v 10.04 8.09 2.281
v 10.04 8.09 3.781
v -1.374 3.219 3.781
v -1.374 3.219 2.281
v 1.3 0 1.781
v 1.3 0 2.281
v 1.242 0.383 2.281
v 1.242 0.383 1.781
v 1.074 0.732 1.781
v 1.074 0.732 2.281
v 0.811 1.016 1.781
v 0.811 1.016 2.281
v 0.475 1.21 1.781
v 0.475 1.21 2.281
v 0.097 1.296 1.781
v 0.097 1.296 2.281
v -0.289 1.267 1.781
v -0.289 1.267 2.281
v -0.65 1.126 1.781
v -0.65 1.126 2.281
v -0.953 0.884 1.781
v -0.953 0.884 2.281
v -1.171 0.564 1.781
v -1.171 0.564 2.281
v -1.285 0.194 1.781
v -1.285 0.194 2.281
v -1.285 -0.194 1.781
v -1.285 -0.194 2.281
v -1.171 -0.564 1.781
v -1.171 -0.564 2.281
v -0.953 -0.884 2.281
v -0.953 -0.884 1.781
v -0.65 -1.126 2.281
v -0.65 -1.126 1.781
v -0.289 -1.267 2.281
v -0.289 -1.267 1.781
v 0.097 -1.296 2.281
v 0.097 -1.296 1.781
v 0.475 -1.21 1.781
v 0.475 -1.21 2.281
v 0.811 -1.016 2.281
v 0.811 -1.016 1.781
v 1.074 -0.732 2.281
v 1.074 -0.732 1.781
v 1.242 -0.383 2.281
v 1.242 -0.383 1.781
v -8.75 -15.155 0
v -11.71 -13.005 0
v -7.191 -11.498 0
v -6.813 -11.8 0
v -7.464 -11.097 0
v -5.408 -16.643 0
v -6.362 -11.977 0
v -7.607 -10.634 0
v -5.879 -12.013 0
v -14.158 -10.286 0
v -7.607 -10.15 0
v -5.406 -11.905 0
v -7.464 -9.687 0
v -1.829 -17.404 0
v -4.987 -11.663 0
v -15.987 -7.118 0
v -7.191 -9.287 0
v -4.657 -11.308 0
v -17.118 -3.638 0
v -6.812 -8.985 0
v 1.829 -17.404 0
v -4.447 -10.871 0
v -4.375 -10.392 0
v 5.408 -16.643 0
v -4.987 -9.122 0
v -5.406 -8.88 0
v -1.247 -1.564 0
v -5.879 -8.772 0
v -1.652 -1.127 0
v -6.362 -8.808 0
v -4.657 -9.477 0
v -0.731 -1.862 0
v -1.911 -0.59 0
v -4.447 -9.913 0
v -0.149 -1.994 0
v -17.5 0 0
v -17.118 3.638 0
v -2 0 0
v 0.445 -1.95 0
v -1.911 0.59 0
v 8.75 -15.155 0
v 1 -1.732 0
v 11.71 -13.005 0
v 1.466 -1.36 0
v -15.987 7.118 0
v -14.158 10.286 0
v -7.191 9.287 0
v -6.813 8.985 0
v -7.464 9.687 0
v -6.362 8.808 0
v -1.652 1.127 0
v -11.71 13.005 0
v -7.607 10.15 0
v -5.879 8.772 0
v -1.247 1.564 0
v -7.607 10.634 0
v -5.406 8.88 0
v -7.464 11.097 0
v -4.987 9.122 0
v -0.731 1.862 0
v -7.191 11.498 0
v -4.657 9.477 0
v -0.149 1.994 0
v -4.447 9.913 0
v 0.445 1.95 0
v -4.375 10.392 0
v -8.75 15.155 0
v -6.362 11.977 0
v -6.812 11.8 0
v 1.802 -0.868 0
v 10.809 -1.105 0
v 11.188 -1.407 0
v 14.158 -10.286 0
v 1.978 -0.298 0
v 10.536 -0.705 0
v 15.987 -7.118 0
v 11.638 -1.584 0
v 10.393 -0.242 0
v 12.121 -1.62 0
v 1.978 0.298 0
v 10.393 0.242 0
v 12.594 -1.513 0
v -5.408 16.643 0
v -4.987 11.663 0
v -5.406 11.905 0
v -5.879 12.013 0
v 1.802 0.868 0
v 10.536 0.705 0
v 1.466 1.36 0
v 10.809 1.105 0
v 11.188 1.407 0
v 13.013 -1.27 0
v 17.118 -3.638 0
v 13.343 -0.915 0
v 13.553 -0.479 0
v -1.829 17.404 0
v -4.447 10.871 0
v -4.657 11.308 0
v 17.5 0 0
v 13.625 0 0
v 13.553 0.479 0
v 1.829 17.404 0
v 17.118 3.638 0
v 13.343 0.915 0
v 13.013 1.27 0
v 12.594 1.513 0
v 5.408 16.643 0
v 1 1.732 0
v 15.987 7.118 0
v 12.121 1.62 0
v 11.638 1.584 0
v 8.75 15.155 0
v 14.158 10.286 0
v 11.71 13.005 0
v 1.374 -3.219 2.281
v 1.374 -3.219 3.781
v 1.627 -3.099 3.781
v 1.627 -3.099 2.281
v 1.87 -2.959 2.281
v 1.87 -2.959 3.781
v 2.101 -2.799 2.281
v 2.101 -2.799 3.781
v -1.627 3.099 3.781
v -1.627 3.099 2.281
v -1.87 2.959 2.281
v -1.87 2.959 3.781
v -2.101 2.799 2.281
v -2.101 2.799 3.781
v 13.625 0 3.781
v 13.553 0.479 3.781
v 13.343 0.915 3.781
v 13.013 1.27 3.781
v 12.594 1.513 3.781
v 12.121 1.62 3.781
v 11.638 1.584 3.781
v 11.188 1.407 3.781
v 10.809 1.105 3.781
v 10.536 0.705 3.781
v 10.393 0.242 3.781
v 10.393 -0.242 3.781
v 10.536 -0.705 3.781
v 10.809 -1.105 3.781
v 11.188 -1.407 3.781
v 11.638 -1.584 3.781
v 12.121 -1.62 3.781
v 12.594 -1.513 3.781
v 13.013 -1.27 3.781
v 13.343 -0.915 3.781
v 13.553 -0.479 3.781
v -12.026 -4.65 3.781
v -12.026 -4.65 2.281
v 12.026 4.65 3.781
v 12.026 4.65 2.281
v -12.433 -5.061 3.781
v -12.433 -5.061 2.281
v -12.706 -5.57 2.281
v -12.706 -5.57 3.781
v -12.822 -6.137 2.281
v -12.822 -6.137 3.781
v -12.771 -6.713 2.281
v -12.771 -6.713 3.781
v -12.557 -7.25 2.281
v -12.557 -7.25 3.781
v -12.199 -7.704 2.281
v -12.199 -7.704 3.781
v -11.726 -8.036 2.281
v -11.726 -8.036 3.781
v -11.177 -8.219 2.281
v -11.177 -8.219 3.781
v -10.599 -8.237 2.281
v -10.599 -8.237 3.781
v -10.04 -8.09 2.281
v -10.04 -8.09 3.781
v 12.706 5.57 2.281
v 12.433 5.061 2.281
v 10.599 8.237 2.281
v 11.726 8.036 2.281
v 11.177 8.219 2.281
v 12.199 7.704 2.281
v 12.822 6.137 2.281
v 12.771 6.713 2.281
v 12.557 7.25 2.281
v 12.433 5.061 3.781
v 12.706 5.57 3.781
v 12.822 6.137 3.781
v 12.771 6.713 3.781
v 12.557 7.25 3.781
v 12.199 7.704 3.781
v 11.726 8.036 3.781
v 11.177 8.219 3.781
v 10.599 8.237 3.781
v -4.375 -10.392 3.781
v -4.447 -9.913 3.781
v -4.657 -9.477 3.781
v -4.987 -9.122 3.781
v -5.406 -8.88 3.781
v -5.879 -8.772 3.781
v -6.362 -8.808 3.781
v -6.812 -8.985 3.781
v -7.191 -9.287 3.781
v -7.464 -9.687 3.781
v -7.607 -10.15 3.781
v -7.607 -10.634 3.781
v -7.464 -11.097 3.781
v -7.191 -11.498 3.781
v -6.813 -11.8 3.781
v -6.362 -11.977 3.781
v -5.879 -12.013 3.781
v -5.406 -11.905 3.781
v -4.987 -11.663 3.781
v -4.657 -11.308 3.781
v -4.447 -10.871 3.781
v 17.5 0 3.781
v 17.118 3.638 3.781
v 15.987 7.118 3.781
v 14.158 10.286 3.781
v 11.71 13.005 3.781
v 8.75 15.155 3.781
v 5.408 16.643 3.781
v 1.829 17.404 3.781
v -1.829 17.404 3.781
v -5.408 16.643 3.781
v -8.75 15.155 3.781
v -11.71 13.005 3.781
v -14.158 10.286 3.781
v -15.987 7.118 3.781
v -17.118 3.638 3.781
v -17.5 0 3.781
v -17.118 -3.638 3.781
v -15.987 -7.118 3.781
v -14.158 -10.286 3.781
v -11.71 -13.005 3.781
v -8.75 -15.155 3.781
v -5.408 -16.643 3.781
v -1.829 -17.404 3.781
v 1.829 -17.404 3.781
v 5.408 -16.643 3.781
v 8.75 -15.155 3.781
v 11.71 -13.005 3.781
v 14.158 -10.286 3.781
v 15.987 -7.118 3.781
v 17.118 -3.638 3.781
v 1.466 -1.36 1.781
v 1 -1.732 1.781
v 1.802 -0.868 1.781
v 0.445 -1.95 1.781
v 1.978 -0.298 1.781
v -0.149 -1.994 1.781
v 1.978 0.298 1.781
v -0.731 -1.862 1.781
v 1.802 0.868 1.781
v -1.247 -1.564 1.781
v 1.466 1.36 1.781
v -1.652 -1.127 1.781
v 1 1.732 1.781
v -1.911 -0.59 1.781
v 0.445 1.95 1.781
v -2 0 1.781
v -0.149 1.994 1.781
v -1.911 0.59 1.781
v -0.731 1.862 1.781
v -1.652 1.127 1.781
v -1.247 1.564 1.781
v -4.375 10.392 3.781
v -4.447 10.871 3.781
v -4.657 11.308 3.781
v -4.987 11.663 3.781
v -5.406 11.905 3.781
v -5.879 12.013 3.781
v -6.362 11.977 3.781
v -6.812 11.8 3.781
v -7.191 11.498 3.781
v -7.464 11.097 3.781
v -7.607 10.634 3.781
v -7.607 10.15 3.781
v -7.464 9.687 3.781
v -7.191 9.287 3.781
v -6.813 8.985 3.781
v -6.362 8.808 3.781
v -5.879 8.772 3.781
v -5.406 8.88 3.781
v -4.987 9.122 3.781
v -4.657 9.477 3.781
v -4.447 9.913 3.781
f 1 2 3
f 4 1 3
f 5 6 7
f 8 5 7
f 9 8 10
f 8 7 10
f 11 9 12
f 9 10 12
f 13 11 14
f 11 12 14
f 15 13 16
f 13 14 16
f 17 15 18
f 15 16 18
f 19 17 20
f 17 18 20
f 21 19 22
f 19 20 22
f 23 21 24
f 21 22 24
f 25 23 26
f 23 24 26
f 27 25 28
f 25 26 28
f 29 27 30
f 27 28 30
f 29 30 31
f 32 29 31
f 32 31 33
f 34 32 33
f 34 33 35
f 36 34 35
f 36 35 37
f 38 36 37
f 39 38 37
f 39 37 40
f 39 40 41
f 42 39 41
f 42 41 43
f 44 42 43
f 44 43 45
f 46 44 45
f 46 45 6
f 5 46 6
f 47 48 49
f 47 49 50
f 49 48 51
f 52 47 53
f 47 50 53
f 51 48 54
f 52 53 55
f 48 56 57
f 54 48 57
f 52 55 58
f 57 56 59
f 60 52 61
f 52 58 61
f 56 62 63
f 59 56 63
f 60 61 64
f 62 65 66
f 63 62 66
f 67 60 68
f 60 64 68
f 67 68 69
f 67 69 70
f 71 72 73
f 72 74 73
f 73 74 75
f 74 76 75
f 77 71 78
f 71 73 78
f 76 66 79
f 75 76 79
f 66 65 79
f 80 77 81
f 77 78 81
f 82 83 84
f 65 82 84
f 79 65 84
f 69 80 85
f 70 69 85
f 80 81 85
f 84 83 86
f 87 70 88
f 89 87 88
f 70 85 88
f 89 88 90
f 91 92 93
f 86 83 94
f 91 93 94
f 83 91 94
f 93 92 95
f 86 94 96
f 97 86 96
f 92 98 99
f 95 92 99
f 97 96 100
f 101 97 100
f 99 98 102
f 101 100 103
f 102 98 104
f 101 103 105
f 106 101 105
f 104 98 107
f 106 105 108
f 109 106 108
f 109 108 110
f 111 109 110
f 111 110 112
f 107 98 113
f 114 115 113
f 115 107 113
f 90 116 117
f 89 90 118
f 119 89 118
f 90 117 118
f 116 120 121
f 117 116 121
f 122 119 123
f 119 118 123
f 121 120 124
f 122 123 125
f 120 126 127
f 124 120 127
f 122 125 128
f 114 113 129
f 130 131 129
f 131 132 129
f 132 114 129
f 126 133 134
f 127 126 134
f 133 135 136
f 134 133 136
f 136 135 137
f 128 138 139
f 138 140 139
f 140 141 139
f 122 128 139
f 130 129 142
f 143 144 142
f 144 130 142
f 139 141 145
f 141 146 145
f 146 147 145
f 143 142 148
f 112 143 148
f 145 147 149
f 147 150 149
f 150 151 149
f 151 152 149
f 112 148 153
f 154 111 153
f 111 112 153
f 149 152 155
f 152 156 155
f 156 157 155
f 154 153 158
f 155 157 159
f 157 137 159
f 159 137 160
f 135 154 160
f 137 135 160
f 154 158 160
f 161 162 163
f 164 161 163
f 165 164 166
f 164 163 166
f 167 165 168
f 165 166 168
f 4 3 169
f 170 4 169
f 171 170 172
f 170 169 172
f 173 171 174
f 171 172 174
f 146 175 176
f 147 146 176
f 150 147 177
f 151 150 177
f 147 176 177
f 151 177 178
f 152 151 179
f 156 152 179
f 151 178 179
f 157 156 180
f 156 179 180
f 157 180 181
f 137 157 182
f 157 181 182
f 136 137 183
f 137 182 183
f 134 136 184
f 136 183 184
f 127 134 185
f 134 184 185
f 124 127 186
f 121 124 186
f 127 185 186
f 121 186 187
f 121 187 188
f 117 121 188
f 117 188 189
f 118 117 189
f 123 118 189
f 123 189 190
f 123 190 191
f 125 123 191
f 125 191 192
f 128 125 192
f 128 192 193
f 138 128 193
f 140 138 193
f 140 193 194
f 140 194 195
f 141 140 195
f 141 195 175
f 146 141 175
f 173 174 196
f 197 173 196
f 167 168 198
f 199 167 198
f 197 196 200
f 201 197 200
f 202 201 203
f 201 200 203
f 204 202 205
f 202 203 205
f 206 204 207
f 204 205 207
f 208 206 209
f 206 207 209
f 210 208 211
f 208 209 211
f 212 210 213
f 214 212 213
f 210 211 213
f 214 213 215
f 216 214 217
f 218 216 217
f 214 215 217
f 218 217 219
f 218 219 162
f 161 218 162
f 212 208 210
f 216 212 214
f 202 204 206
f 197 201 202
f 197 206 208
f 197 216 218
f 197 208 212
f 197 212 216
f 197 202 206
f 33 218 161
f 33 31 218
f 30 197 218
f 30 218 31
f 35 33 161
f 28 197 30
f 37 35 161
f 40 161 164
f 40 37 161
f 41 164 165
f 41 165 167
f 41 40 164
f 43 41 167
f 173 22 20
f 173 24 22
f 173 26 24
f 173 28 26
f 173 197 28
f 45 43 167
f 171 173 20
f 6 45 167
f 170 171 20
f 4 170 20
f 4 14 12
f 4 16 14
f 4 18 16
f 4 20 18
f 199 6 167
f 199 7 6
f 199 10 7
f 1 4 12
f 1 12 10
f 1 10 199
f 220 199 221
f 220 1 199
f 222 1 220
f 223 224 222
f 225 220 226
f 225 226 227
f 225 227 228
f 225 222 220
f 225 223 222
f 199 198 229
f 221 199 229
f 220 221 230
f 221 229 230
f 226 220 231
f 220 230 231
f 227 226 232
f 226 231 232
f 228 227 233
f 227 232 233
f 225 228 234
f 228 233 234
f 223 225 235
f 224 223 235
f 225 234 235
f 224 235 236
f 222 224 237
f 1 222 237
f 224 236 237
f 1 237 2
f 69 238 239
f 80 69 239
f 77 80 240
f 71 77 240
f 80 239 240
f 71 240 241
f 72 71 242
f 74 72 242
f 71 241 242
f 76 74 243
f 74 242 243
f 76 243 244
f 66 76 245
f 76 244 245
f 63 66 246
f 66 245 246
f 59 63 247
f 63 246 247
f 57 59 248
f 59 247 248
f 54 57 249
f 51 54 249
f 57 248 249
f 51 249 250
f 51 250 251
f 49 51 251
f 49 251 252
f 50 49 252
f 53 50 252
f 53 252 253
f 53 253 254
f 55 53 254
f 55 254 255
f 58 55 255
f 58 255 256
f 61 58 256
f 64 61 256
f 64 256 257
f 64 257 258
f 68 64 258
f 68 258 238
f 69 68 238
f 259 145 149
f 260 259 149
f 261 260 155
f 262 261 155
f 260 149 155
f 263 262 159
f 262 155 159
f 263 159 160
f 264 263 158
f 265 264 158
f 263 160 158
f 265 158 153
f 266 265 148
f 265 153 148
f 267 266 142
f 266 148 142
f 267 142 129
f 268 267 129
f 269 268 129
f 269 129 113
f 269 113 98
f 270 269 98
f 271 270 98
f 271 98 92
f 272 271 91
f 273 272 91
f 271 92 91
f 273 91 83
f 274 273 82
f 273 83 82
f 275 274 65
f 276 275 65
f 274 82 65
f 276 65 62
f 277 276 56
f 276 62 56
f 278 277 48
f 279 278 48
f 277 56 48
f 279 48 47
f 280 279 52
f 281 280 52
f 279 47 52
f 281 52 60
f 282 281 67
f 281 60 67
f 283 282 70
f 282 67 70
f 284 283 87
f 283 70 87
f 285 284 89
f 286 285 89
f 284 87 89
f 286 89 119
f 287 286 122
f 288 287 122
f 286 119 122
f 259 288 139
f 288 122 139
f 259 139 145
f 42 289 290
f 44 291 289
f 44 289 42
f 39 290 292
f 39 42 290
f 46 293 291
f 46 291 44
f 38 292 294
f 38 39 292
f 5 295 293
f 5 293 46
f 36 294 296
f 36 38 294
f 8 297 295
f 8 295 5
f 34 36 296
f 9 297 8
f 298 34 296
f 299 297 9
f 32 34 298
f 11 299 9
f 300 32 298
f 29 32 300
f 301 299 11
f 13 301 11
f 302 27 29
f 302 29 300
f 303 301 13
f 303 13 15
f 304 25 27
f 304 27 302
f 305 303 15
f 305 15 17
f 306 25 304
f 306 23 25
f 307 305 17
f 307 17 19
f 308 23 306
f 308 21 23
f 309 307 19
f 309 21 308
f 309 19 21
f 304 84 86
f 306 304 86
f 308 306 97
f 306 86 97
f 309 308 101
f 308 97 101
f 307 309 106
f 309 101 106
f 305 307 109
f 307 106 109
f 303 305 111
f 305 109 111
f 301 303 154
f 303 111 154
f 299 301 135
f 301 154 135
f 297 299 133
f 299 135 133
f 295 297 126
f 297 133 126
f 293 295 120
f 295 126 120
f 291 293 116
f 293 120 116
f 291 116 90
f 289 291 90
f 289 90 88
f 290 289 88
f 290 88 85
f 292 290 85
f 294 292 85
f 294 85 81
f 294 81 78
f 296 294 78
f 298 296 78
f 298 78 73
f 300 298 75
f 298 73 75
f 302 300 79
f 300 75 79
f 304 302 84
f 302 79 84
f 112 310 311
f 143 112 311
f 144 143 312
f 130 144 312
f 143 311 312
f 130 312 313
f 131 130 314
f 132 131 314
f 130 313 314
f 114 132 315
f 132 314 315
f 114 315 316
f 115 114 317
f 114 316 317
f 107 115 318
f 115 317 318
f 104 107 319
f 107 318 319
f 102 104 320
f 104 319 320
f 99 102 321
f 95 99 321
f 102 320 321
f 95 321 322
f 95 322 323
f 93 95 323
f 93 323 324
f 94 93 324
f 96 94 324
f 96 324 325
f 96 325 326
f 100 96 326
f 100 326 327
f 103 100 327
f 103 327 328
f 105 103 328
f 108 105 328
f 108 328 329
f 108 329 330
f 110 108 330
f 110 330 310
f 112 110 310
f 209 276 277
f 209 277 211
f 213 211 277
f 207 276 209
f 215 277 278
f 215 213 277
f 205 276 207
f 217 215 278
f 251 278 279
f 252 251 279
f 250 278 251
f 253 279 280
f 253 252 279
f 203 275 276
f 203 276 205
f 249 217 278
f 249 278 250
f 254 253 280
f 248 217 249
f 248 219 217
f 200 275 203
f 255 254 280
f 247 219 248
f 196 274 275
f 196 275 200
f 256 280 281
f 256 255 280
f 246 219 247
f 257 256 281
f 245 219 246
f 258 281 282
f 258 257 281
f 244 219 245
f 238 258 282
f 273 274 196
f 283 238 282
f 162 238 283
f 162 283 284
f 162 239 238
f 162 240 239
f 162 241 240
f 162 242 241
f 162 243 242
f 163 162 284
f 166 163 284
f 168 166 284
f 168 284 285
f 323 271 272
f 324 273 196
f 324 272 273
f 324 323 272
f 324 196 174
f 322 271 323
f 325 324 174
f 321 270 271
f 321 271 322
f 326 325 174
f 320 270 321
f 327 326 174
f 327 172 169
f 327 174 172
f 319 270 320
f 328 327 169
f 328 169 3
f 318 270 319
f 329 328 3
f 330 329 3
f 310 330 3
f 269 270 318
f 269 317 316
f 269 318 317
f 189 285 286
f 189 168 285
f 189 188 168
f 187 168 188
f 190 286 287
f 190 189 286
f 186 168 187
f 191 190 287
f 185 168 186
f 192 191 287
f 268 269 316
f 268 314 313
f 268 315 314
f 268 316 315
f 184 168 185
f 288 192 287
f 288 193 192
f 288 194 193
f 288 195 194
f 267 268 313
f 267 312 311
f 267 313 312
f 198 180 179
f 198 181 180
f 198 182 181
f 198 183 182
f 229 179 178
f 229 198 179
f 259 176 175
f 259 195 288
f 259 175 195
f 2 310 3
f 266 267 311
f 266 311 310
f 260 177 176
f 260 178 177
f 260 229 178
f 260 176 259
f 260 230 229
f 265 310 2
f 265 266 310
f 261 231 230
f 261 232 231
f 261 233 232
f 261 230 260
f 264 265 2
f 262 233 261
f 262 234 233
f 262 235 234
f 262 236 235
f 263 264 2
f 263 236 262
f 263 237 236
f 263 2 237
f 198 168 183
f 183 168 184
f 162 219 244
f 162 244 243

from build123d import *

# Parameters (mm, degrees)
SCHIZZO1_R                   = 17.5
ESTRUSIONE_ESTRUSIONE1_DEPTH = 3.781092502
SCHIZZO2_R                   = 1.625
SCHIZZO2_R_2                 = 1.3
TAGLIO_ESTRUSIONE1_DEPTH     = 4.781092502
CUT_EXTRUDE1_DEPTH           = 1.5
SCHIZZO4_R                   = 2
TAGLIO_ESTRUSIONE2_DEPTH     = 1.781093


with BuildPart() as part:
    # Schizzo1 → Estrusione-Estrusione1 (new body)
    with BuildSketch(Plane.XY):
        Circle(SCHIZZO1_R)
    extrude(amount=ESTRUSIONE_ESTRUSIONE1_DEPTH)

    # Schizzo2 → Taglio-Estrusione1 (cut, through all)
    with BuildSketch(Plane.XY.offset(3.781092502)):
        with Locations((12, 0)):
            Circle(SCHIZZO2_R)
        with Locations((-6, 10.392304845)):
            Circle(SCHIZZO2_R)
        with Locations((-6, -10.392304845)):
            Circle(SCHIZZO2_R)
        Circle(SCHIZZO2_R_2)
    extrude(amount=-TAGLIO_ESTRUSIONE1_DEPTH, mode=Mode.SUBTRACT)

    # Sketch1 → Cut-Extrude1 (cut)
    with BuildSketch(Plane.XY.offset(3.781092502)):
        with BuildLine():
            Line((2.10108498, -2.799185936), (12.025937536, 4.650465179))
            ThreePointArc((12.025937536, 4.650465179), (12.557368355, 7.25), (10.040389753, 8.089534821))
            Line((10.040389753, 8.089534821), (-1.373623641, 3.219185936))
            ThreePointArc((-1.373623641, 3.219185936), (-1.75, 3.031088913), (-2.10108498, 2.799185936))
            Line((-2.10108498, 2.799185936), (-12.025937536, -4.650465179))
            ThreePointArc((-12.025937536, -4.650465179), (-12.557368355, -7.25), (-10.040389753, -8.089534821))
            Line((-10.040389753, -8.089534821), (1.373623641, -3.219185936))
            ThreePointArc((1.373623641, -3.219185936), (1.75, -3.031088913), (2.10108498, -2.799185936))
        make_face()
    extrude(amount=-CUT_EXTRUDE1_DEPTH, mode=Mode.SUBTRACT)

    # Schizzo4 → Taglio-Estrusione2 (cut)
    with BuildSketch(Plane(origin=(0, 0, 0), x_dir=(-1, 0, 0), z_dir=(0, 0, -1))):
        Circle(SCHIZZO4_R)
    extrude(amount=-TAGLIO_ESTRUSIONE2_DEPTH, mode=Mode.SUBTRACT)


solid = part.part
